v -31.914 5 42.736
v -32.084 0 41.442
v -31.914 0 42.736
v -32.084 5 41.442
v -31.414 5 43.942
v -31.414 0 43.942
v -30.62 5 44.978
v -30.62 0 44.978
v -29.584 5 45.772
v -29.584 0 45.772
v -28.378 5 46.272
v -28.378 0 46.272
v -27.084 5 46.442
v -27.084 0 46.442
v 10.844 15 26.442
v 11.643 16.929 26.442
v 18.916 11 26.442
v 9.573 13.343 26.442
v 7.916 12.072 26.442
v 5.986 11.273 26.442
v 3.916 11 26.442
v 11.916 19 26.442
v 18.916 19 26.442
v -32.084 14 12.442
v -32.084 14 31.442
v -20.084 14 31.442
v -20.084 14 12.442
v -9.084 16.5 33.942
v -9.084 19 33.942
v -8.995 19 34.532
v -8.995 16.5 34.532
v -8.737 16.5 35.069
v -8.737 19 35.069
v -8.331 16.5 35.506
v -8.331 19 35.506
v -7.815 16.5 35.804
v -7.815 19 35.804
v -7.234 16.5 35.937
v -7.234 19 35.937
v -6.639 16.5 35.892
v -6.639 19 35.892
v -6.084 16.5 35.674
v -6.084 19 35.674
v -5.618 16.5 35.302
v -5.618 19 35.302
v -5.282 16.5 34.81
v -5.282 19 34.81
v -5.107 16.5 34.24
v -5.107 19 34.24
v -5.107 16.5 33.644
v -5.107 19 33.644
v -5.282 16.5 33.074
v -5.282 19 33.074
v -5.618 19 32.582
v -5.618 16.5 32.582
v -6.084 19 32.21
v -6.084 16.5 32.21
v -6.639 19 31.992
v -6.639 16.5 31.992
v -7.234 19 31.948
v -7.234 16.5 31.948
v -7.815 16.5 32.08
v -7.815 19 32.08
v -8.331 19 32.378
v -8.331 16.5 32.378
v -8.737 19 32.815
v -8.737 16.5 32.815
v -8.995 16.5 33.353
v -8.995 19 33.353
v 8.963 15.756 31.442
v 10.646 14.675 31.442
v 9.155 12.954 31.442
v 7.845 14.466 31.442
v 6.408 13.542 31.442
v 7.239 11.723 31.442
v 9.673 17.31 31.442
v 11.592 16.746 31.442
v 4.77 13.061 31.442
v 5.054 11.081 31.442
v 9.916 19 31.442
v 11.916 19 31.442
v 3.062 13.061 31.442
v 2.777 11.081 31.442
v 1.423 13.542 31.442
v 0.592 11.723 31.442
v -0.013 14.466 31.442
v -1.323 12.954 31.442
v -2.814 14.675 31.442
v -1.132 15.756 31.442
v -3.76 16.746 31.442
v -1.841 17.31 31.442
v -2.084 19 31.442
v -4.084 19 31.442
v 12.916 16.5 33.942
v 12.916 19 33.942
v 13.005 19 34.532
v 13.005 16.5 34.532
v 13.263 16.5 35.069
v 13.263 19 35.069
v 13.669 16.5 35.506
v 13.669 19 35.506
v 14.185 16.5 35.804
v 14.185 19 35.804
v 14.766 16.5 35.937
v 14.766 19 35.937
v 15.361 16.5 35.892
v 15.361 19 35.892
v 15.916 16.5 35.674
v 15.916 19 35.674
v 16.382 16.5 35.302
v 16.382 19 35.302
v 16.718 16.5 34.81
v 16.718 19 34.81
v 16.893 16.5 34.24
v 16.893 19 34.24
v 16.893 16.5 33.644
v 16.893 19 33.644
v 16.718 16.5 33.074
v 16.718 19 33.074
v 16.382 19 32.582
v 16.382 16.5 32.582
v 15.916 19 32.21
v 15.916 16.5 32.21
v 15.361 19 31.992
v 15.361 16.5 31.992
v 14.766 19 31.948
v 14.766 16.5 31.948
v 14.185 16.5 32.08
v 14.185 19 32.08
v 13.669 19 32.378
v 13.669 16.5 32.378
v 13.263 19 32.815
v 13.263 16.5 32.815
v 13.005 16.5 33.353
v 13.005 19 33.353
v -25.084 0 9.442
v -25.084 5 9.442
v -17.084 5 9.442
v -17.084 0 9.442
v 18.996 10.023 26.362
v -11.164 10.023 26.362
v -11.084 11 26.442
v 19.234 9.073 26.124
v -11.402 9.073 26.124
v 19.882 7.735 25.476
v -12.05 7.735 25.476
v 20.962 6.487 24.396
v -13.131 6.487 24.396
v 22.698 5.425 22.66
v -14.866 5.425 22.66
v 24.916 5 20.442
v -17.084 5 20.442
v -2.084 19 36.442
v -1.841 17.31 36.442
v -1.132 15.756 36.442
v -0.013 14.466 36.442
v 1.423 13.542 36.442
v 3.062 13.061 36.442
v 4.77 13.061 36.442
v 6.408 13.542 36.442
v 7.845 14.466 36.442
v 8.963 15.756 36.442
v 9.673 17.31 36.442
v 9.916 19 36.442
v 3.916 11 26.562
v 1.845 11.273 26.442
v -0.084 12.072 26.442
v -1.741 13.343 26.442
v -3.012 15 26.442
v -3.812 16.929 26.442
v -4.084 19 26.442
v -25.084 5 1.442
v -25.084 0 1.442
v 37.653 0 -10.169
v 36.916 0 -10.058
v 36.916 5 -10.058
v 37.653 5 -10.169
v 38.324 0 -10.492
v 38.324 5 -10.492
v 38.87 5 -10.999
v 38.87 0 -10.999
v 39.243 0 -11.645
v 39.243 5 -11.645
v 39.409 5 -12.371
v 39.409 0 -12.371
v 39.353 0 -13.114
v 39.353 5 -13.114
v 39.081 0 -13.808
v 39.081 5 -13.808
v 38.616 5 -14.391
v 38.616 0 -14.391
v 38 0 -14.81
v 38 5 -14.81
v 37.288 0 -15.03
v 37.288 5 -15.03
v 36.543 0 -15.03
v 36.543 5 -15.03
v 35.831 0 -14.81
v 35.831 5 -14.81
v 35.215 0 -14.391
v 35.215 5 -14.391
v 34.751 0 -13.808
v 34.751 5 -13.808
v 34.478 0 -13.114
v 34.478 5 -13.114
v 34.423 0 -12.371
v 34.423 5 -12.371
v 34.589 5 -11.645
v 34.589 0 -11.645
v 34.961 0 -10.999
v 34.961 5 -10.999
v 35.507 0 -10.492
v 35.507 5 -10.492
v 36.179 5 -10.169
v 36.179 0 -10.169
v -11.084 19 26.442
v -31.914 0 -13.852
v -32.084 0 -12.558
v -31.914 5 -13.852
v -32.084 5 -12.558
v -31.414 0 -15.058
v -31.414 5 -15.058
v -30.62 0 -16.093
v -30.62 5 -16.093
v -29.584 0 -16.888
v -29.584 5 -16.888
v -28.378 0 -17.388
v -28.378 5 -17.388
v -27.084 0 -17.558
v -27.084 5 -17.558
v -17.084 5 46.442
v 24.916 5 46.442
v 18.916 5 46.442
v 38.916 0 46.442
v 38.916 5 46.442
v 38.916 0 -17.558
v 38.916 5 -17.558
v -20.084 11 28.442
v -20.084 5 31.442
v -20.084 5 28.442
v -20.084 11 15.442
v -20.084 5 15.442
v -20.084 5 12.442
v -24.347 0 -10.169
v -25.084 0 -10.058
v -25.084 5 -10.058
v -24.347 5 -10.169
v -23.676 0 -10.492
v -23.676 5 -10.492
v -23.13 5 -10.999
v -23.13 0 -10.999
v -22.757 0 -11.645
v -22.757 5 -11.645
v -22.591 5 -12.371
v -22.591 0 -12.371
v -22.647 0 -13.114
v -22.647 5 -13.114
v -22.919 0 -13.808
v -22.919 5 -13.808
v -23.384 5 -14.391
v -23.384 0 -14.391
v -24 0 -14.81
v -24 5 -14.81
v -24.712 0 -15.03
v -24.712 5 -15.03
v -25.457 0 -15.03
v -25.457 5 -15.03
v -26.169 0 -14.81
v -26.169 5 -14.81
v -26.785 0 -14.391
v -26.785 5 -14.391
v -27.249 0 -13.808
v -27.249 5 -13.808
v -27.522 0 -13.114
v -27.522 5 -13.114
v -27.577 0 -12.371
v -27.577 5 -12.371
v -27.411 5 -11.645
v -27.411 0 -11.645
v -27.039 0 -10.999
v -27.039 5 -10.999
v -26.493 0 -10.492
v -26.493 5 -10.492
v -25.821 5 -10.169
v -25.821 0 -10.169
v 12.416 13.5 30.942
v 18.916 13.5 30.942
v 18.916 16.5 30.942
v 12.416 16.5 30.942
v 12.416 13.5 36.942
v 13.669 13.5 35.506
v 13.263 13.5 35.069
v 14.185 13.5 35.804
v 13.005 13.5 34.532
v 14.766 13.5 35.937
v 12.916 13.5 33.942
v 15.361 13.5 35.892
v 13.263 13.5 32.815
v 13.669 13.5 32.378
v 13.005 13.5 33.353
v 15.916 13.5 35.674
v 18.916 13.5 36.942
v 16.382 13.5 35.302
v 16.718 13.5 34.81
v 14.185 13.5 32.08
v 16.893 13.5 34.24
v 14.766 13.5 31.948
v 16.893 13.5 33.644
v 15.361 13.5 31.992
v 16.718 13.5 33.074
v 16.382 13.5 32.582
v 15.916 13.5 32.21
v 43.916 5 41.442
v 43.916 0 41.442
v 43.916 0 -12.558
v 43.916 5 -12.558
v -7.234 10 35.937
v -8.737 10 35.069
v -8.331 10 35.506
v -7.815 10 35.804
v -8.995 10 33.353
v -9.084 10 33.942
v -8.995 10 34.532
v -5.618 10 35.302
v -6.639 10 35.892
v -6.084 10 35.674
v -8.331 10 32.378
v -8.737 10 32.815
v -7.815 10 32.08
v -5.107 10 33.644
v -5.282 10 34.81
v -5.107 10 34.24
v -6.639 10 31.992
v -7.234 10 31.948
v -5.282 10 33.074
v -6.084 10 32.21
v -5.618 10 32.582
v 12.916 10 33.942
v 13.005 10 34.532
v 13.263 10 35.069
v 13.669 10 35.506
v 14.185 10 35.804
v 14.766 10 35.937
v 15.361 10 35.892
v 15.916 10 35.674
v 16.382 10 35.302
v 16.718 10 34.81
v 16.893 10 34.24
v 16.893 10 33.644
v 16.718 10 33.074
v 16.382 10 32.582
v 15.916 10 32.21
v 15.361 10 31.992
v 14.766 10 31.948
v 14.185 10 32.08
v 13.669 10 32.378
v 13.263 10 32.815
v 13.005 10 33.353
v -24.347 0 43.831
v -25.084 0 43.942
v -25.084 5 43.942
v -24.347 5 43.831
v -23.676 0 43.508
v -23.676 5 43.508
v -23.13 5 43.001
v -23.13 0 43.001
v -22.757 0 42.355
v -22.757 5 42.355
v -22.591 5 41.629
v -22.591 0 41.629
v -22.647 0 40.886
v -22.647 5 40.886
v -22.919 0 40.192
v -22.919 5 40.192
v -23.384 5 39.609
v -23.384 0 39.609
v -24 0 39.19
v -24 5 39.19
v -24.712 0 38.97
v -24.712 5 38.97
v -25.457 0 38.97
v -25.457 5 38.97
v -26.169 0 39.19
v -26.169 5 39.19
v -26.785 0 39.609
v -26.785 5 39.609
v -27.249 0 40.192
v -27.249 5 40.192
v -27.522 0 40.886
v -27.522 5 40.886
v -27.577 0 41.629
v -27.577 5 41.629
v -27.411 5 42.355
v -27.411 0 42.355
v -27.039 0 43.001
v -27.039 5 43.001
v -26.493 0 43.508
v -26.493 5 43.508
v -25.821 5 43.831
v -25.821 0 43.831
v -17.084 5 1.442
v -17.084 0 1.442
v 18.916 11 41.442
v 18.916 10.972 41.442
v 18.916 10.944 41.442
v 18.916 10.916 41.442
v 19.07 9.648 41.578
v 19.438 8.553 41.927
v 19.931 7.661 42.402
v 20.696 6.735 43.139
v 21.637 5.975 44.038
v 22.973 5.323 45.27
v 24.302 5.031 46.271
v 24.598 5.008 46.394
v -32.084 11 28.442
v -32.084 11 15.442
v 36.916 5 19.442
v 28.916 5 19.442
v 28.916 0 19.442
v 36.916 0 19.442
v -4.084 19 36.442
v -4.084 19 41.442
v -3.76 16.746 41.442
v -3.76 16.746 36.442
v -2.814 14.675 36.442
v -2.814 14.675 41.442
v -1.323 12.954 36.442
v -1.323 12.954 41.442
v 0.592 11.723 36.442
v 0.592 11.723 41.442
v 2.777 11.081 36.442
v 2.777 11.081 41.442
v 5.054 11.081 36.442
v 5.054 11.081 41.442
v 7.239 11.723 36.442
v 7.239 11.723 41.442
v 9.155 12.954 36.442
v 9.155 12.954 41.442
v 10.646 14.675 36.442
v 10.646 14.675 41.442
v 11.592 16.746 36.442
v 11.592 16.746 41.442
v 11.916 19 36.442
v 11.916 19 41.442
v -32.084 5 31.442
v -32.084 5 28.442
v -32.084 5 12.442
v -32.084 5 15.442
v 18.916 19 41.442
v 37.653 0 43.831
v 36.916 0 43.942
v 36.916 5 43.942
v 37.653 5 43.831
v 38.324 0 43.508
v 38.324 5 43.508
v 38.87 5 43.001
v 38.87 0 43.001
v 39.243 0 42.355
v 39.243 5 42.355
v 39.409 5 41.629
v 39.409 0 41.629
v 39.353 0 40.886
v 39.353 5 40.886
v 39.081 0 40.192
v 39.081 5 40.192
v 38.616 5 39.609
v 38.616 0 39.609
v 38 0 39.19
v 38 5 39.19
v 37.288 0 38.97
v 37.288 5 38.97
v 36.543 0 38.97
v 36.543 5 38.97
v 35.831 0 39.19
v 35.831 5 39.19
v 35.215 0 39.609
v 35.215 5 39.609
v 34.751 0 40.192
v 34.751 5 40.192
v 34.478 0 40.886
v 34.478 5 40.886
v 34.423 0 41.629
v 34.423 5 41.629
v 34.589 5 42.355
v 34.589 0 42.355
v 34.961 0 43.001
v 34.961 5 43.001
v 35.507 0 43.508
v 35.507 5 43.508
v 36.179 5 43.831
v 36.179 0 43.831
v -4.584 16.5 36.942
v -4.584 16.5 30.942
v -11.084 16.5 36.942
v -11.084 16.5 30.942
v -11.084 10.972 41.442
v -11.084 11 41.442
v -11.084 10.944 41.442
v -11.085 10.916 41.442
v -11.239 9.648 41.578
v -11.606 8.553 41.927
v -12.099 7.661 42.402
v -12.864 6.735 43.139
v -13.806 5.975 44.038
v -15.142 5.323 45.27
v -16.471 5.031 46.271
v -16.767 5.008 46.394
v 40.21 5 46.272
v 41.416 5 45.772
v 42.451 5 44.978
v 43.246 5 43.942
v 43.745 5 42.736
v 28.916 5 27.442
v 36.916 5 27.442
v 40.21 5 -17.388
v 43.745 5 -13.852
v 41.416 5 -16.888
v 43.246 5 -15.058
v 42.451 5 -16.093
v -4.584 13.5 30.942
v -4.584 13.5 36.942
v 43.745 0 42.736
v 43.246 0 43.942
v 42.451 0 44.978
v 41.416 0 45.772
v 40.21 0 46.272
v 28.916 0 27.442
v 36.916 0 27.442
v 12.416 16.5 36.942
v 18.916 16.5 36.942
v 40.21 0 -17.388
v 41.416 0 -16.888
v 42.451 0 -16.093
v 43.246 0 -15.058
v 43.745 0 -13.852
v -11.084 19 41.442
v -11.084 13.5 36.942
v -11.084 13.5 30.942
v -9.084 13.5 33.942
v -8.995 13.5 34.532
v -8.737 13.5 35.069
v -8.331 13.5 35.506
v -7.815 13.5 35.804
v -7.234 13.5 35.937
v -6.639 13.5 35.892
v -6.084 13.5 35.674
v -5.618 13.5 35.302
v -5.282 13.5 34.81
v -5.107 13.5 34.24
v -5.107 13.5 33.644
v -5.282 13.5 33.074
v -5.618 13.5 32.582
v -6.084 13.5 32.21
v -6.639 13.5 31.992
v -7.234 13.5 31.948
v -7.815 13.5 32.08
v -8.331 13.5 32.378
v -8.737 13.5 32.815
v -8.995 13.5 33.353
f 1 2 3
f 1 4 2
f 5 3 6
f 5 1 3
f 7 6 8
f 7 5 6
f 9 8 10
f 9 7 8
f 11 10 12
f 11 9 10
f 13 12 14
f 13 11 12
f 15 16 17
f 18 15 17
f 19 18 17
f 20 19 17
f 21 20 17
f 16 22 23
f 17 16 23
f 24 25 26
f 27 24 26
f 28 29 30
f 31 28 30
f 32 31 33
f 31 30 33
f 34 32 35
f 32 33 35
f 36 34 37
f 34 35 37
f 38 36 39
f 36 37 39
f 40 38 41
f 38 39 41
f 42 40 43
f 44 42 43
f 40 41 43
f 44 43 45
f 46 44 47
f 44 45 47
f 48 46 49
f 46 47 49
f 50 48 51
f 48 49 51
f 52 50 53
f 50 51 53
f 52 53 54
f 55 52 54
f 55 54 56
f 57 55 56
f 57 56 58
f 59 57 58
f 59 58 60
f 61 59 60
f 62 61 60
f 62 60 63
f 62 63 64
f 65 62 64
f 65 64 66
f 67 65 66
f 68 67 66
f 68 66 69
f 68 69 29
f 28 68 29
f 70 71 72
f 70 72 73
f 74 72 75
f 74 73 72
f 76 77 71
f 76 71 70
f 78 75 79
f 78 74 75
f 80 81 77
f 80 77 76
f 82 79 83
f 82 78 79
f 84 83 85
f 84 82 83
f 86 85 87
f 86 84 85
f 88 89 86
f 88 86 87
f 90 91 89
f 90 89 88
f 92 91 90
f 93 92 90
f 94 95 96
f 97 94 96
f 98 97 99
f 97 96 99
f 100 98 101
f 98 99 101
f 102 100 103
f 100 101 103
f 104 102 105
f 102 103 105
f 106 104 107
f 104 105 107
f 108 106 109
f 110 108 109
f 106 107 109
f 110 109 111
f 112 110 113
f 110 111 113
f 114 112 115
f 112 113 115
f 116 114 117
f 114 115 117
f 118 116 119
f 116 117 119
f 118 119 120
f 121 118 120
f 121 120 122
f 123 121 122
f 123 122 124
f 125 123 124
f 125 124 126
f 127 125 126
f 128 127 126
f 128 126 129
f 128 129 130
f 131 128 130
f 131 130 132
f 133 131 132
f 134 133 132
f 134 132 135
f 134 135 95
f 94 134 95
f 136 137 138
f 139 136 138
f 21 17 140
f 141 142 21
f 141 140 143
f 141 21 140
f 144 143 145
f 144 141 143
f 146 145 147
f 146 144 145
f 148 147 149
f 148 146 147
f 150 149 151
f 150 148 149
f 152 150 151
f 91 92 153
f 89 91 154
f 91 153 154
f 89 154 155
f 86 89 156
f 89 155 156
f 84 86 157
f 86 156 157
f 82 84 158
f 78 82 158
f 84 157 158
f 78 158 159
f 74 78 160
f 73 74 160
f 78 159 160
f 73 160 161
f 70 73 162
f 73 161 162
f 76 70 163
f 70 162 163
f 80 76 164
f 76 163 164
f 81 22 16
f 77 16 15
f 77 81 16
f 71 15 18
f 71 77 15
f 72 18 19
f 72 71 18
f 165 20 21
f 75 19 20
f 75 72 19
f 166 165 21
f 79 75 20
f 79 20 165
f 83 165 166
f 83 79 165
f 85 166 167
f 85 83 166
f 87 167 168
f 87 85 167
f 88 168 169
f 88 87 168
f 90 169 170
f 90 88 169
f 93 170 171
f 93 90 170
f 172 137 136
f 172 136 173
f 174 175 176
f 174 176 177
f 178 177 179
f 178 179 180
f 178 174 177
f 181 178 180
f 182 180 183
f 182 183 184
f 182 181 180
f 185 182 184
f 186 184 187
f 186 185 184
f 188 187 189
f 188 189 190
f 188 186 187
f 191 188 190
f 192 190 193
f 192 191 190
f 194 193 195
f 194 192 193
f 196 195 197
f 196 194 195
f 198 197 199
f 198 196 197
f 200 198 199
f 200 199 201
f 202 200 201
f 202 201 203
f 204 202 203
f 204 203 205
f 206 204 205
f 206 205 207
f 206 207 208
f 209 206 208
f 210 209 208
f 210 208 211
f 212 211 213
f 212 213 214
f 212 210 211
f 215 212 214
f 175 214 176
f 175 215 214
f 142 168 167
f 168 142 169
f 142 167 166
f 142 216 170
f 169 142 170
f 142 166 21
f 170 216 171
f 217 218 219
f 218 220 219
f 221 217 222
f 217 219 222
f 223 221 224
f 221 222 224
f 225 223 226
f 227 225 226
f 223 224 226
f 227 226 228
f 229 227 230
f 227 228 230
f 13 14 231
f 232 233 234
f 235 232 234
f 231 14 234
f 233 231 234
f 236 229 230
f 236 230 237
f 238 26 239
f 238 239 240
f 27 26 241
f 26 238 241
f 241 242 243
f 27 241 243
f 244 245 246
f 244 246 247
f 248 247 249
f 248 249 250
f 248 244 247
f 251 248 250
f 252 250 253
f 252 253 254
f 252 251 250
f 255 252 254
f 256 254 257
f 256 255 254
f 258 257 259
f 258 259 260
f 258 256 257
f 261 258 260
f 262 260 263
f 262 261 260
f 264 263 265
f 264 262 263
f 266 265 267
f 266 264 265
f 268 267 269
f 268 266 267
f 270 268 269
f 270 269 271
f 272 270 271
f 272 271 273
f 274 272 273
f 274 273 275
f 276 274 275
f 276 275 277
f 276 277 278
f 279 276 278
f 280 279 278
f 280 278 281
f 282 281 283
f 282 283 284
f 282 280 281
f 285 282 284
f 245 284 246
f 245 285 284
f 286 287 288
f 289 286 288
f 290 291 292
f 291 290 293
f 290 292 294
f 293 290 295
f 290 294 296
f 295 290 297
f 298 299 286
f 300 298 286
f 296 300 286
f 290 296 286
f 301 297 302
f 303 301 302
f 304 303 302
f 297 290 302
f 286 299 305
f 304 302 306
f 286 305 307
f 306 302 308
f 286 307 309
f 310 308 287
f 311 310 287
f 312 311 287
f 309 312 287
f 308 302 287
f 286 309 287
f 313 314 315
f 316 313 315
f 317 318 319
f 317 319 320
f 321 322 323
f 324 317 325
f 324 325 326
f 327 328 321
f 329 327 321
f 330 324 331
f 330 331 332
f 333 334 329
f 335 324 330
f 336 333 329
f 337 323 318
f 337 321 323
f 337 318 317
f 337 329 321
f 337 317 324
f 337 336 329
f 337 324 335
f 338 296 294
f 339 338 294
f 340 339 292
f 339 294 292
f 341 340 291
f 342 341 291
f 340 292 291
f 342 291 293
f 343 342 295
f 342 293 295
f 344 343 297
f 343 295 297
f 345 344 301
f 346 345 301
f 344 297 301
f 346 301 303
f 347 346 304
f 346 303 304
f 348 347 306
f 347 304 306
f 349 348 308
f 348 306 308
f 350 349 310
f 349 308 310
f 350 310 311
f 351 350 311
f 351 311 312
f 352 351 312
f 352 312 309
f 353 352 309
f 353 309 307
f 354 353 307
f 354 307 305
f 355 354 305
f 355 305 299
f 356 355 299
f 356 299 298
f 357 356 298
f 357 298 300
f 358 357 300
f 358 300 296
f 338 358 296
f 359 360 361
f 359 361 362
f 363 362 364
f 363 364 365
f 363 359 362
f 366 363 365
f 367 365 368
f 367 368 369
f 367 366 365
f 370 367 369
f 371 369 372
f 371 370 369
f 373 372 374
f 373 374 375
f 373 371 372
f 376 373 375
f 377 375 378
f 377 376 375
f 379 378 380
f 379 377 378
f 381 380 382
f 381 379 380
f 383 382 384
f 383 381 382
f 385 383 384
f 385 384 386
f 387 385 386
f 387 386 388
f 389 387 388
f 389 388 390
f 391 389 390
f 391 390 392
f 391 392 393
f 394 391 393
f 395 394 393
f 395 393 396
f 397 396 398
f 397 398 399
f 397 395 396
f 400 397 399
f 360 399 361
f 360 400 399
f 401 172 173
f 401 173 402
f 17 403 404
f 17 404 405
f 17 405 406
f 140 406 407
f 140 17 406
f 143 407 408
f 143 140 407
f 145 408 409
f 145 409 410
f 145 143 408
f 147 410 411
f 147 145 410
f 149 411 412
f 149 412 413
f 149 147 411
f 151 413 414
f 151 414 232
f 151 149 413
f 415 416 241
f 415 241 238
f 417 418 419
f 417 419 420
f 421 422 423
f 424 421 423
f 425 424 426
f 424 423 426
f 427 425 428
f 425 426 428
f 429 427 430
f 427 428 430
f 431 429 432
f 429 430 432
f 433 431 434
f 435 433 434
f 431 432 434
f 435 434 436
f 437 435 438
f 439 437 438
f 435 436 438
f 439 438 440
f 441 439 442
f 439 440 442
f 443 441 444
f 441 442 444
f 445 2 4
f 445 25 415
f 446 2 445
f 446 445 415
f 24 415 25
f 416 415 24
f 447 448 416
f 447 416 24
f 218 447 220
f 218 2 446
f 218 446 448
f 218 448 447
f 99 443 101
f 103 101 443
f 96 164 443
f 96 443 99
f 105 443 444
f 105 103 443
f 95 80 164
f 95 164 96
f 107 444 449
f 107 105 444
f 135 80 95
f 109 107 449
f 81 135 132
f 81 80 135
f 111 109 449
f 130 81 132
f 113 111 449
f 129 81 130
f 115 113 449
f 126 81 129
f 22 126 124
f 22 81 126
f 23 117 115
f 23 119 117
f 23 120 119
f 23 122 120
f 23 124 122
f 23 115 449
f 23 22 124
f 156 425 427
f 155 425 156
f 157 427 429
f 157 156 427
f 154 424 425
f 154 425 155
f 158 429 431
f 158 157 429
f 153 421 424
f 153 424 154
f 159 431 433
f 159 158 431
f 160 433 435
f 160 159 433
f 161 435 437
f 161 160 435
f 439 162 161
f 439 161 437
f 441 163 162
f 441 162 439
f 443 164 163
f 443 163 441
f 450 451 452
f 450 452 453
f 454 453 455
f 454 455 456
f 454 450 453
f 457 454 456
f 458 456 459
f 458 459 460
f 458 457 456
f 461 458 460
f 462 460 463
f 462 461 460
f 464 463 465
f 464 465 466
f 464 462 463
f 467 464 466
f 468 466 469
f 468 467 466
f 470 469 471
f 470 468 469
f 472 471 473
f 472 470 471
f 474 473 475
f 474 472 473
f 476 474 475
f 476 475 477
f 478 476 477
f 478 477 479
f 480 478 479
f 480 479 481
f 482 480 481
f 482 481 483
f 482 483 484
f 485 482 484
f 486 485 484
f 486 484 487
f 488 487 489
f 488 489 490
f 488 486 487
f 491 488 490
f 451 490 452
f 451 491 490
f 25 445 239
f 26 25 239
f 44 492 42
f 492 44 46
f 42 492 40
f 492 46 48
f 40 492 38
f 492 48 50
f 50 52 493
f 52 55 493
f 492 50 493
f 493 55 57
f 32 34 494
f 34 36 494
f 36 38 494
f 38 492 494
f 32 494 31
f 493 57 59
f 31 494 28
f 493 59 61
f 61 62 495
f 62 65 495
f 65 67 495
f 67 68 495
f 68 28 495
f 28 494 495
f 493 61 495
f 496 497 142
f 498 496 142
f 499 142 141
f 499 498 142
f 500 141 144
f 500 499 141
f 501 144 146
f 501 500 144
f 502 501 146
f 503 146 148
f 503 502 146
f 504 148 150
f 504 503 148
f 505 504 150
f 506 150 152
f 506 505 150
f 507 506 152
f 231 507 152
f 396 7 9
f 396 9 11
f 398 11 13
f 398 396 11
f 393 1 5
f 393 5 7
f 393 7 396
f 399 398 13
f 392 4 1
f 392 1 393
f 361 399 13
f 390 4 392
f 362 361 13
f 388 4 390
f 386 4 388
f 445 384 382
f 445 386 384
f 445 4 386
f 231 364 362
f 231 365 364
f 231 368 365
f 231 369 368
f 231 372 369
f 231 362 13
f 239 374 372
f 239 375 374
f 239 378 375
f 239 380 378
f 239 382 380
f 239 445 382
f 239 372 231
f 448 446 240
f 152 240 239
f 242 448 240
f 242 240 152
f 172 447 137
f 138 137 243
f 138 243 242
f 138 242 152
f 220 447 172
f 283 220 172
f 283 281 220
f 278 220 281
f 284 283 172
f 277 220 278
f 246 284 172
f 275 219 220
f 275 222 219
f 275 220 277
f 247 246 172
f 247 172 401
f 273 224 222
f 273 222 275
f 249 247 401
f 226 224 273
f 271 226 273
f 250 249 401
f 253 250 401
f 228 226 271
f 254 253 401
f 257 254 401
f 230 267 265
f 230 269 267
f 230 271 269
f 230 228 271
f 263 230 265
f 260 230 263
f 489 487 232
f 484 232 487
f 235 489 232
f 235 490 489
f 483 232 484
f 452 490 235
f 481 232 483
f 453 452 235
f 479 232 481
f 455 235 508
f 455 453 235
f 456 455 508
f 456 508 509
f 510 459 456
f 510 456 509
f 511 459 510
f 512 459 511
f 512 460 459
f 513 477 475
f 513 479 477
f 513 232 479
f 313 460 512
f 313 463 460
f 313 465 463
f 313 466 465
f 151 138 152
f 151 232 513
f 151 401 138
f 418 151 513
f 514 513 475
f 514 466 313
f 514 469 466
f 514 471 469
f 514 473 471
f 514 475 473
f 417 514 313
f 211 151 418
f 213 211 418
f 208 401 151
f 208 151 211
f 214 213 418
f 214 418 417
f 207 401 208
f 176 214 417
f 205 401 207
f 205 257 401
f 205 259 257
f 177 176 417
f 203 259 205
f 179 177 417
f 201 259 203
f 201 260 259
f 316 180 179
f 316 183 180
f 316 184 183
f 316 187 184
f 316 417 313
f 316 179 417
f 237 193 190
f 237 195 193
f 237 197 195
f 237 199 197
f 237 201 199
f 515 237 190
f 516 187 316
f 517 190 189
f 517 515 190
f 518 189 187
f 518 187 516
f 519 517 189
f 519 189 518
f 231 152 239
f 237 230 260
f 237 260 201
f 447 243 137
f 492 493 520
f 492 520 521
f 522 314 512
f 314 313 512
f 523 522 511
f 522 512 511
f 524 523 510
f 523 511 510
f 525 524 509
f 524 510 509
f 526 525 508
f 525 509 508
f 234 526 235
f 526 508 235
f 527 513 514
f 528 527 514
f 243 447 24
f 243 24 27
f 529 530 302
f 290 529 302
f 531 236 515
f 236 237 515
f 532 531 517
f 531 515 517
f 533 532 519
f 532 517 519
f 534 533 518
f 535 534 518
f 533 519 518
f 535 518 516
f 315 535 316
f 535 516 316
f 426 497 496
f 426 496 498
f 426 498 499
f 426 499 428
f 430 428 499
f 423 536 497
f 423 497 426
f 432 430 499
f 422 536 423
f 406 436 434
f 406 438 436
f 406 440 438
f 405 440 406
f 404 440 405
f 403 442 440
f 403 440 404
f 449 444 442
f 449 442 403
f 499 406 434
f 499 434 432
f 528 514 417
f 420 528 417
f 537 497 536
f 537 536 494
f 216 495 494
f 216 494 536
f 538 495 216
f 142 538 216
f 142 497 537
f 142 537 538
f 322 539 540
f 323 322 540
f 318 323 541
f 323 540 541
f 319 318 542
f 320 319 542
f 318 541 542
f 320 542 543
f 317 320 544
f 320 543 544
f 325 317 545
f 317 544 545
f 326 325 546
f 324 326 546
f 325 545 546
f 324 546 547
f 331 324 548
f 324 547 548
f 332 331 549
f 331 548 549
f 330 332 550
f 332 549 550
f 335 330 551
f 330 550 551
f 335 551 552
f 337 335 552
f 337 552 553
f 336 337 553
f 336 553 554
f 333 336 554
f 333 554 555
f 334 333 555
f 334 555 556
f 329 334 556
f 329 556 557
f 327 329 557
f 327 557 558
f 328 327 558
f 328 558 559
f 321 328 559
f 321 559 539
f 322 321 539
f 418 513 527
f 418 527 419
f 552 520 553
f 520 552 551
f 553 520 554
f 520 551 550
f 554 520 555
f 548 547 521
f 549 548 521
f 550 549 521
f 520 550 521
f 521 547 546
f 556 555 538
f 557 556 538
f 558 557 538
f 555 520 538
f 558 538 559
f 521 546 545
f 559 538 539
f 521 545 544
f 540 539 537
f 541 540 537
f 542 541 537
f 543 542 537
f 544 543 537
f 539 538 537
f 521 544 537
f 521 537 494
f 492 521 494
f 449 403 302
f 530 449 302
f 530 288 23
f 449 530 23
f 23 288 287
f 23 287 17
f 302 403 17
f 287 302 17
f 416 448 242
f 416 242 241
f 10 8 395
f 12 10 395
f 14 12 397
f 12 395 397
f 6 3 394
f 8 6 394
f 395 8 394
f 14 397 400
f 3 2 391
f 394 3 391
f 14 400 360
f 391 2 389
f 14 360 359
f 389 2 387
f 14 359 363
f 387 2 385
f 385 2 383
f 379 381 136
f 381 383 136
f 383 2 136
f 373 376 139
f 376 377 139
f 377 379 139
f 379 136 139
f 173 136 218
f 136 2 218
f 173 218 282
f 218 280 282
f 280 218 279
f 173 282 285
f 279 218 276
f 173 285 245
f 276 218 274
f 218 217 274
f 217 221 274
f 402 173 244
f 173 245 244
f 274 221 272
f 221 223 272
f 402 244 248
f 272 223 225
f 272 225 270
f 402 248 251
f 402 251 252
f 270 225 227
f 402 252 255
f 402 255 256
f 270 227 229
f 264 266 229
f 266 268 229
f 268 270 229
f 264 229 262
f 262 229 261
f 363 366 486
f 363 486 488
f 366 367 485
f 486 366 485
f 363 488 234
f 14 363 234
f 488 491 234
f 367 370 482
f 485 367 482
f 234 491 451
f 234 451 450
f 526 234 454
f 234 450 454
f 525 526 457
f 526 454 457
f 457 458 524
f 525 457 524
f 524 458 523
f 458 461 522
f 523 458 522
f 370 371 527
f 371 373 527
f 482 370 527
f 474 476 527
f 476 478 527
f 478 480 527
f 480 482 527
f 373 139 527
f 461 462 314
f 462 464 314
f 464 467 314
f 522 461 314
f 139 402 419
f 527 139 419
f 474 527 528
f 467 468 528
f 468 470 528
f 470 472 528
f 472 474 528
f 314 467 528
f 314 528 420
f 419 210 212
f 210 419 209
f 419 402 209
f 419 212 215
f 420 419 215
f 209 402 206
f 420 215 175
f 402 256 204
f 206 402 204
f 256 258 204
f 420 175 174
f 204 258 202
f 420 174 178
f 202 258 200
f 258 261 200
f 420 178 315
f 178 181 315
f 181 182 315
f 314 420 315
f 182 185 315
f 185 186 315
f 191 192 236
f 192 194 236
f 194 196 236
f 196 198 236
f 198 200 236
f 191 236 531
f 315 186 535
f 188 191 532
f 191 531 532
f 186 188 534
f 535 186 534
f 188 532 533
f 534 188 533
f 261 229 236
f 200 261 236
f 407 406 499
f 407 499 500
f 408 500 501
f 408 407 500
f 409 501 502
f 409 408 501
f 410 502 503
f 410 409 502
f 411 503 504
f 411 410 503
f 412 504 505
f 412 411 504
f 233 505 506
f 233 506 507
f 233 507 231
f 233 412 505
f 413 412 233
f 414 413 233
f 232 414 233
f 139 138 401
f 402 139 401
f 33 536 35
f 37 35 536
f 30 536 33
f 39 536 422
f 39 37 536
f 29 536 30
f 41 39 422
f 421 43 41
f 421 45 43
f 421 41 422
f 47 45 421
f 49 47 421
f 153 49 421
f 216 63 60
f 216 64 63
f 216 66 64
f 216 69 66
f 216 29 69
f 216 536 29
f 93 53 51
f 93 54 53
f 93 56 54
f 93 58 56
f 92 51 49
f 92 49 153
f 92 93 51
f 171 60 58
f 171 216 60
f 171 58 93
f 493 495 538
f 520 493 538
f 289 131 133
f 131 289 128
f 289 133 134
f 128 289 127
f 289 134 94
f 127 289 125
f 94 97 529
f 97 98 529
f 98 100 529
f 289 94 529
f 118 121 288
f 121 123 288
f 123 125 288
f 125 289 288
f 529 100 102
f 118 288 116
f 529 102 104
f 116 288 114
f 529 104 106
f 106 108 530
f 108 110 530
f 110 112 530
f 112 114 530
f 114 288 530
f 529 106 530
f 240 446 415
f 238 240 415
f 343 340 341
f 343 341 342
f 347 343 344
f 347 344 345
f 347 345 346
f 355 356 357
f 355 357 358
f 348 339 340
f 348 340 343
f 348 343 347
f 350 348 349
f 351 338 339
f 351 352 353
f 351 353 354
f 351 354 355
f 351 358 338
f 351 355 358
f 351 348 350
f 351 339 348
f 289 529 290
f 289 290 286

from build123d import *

# Parameters (mm, degrees)
SKETCH1_W           = 76
SKETCH1_H           = 64
SKETCH1_R           = 2.5
BOSS_EXTRUDE1_DEPTH = 5
SKETCH2_W           = 30
SKETCH2_H           = 15
BOSS_EXTRUDE2_DEPTH = 14
SKETCH3_R           = 6
CUT_EXTRUDE1_DEPTH  = 76.964442768
CUT_EXTRUDE2_DEPTH  = 5
CUT_EXTRUDE3_START  = -5
CUT_EXTRUDE3_DEPTH  = 5
FILLET1_R           = 6
SKETCH6_W           = 8
SKETCH6_H           = 8
CUT_EXTRUDE4_DEPTH  = 66.432910035
SKETCH7_W           = 12
SKETCH7_H           = 19
BOSS_EXTRUDE3_DEPTH = 9
SKETCH9_W           = 13
SKETCH9_H           = 6
CUT_EXTRUDE5_DEPTH  = 14
FILLET3_R           = 5
CUT_EXTRUDE6_DEPTH  = 9
SKETCH11_W          = 3
SKETCH11_H          = 1.5
CUT_EXTRUDE7_DEPTH  = 6.5
SKETCH13_W          = 3
SKETCH13_H          = 1.5
CUT_EXTRUDE8_DEPTH  = 6.5


with BuildPart() as part:
    # Sketch1 → Boss-Extrude1 (new body)
    with BuildSketch(Plane(origin=(0, 0, 0), x_dir=(1, 0, 0), z_dir=(0, 1, 0))):
        with Locations((5.915789474, -14.442105263)):
            Rectangle(SKETCH1_W, SKETCH1_H)
        with Locations(Location((36.915789474, 12.557894737, 0), (0, 0, 270))):
            Circle(SKETCH1_R, mode=Mode.SUBTRACT)
        with Locations(Location((-25.084210526, 12.557894737, 0), (0, 0, 270))):
            Circle(SKETCH1_R, mode=Mode.SUBTRACT)
        with Locations(Location((36.915789474, -41.442105263, 0), (0, 0, 270))):
            Circle(SKETCH1_R, mode=Mode.SUBTRACT)
        with Locations(Location((-25.084210526, -41.442105263, 0), (0, 0, 270))):
            Circle(SKETCH1_R, mode=Mode.SUBTRACT)
    extrude(amount=BOSS_EXTRUDE1_DEPTH)

    # Sketch2 → Boss-Extrude2 (add)
    with BuildSketch(Plane(origin=(0, 5, 0), x_dir=(1, 0, 0), z_dir=(0, 1, 0))):
        with Locations((3.915789474, -33.942105263)):
            Rectangle(SKETCH2_W, SKETCH2_H)
    extrude(amount=BOSS_EXTRUDE2_DEPTH)

    # Sketch3 → Cut-Extrude1 (cut, through all)
    with BuildSketch(Plane.XY.offset(41.442105263)):
        with Locations((3.915789474, 19)):
            Circle(SKETCH3_R)
    extrude(amount=-CUT_EXTRUDE1_DEPTH, mode=Mode.SUBTRACT)

    # Sketch4 → Cut-Extrude2 (cut)
    with BuildSketch(Plane.XY.offset(41.442105263)):
        with BuildLine():
            ThreePointArc((9.915789474, 19), (3.915789474, 13), (-2.084210526, 19))
            Line((-2.084210526, 19), (-4.084210526, 19))
            ThreePointArc((-4.084210526, 19), (3.915789474, 11), (11.915789474, 19))
            Line((11.915789474, 19), (9.915789474, 19))
        make_face()
    extrude(amount=-CUT_EXTRUDE2_DEPTH, mode=Mode.SUBTRACT)

    # Sketch5 → Cut-Extrude3 (cut)
    with BuildSketch(Plane(origin=(0, 0, 26.442105263), x_dir=(-1, 0, 0), z_dir=(0, 0, -1)).offset(CUT_EXTRUDE3_START)):
        with BuildLine():
            ThreePointArc((2.084210526, 19), (-3.915789474, 13), (-9.915789474, 19))
            Line((-9.915789474, 19), (-11.915789474, 19))
            ThreePointArc((-11.915789474, 19), (-3.915789474, 11), (4.084210526, 19))
            Line((4.084210526, 19), (2.084210526, 19))
        make_face()
    extrude(amount=CUT_EXTRUDE3_DEPTH, mode=Mode.SUBTRACT)

    # Fillet1
    # the kernel refuses this fillet: 6 mm, written as the material it adds along each edge
    with BuildSketch(Plane(origin=(-11.084210526, 5, 41.442105263), x_dir=(-1, 0, 0), z_dir=(0, 0, -1)), Plane(origin=(18.915789474, 5, 26.442105263), x_dir=(1, 0, 0), z_dir=(0, 0, 1))) as fillet1_piece_1:
        with BuildLine():
            CenterArc((FILLET1_R, FILLET1_R), FILLET1_R, 180, 90)
            Line((0, FILLET1_R), (-FILLET1_R * 0.02, FILLET1_R))
            Line((-FILLET1_R * 0.02, FILLET1_R), (-FILLET1_R * 0.02, -FILLET1_R * 0.02))
            Line((-FILLET1_R * 0.02, -FILLET1_R * 0.02), (FILLET1_R, -FILLET1_R * 0.02))
            Line((FILLET1_R, -FILLET1_R * 0.02), (FILLET1_R, 0))
        make_face()
    extrude(amount=15)
    with BuildSketch(Plane(origin=(18.915789474, 5, 41.442105263), x_dir=(0, 0, 1), z_dir=(-1, 0, 0))) as fillet1_piece_2:
        with BuildLine():
            CenterArc((6, 5.916079783), FILLET1_R, 180, 80.405931773)
            Line((0, 5.916079783), (-0.12, 5.916079783))
            Line((-0.12, 5.916079783), (-0.12, 0))
            Line((-0.12, 0), (0, -0.12))
            ThreePointArc((0, -0.12), (2.5, -0.12), (4.98, -0.118321596))
            Line((4.98, -0.118321596), (5, 0))
        make_face()
    extrude(amount=30)
    with BuildSketch(Plane(origin=(-11.084210526, 5, 26.442105263), x_dir=(0, 0, -1), z_dir=(1, 0, 0))) as fillet1_piece_3:
        with BuildLine():
            CenterArc((FILLET1_R, FILLET1_R), FILLET1_R, 180, 90)
            Line((0, FILLET1_R), (-FILLET1_R * 0.02, FILLET1_R))
            Line((-FILLET1_R * 0.02, FILLET1_R), (-FILLET1_R * 0.02, -FILLET1_R * 0.02))
            Line((-FILLET1_R * 0.02, -FILLET1_R * 0.02), (FILLET1_R, -FILLET1_R * 0.02))
            Line((FILLET1_R, -FILLET1_R * 0.02), (FILLET1_R, 0))
        make_face()
    extrude(amount=30)
    with BuildSketch(Plane(origin=(18.915789474, 5, 41.442105263), x_dir=(0, 0, 1), z_dir=(-1, 0, 0))) as fillet1_piece_4a_section:
        with BuildLine():
            CenterArc((6, 5.916079783), FILLET1_R, 180, 80.405931773)
            Line((0, 5.916079783), (-0.12, 5.916079783))
            Line((-0.12, 5.916079783), (-0.12, 0))
            Line((-0.12, 0), (0, -0.12))
            ThreePointArc((0, -0.12), (2.5, -0.12), (4.98, -0.118321596))
            Line((4.98, -0.118321596), (5, 0))
        make_face()
    fillet1_piece_4a = extrude(amount=44.790199458, mode=Mode.PRIVATE)
    fillet1_piece_4a = fillet1_piece_4a - Plane(origin=(-25.084210526, 6.312351874, 41.442105263), x_dir=(0, 0, 1), z_dir=(0, -1, 0)) * Cylinder(2.5, 114, mode=Mode.PRIVATE)
    fillet1_piece_4a = split(fillet1_piece_4a, bisect_by=Plane(origin=(-11.084210526, 6.312351874, 42.775348467), z_dir=(-1, 0, 0)), keep=Keep.TOP, mode=Mode.PRIVATE)
    with BuildSketch(Plane(origin=(-11.084210526, 5, 56.442105263), x_dir=(-1, 0, 0), z_dir=(0, 0, -1))) as fillet1_piece_4b_section:
        with BuildLine():
            CenterArc((FILLET1_R, FILLET1_R), FILLET1_R, 180, 90)
            Line((0, FILLET1_R), (-FILLET1_R * 0.02, FILLET1_R))
            Line((-FILLET1_R * 0.02, FILLET1_R), (-FILLET1_R * 0.02, -FILLET1_R * 0.02))
            Line((-FILLET1_R * 0.02, -FILLET1_R * 0.02), (FILLET1_R, -FILLET1_R * 0.02))
            Line((FILLET1_R, -FILLET1_R * 0.02), (FILLET1_R, 0))
        make_face()
    fillet1_piece_4b = extrude(amount=30, mode=Mode.PRIVATE)
    fillet1_piece_4b = split(fillet1_piece_4b, bisect_by=Plane(origin=(-12.442581212, 6.358370686, 46.442105263), z_dir=(0, 0, -1)), keep=Keep.TOP, mode=Mode.PRIVATE)
    fillet1_piece_4b = split(fillet1_piece_4b, bisect_by=Plane(origin=(-12.442581212, 6.358370686, 41.442105263), z_dir=(0, 0, 1)), keep=Keep.TOP, mode=Mode.PRIVATE)
    fillet1_piece_4 = fillet1_piece_4a & fillet1_piece_4b
    add(fillet1_piece_4)
    with BuildSketch(Plane(origin=(-26.084210526, 5, 26.442105263), x_dir=(0, 0, -1), z_dir=(1, 0, 0))) as fillet1_piece_5a_section:
        with BuildLine():
            CenterArc((FILLET1_R, FILLET1_R), FILLET1_R, 180, 90)
            Line((0, FILLET1_R), (-FILLET1_R * 0.02, FILLET1_R))
            Line((-FILLET1_R * 0.02, FILLET1_R), (-FILLET1_R * 0.02, -FILLET1_R * 0.02))
            Line((-FILLET1_R * 0.02, -FILLET1_R * 0.02), (FILLET1_R, -FILLET1_R * 0.02))
            Line((FILLET1_R, -FILLET1_R * 0.02), (FILLET1_R, 0))
        make_face()
    fillet1_piece_5a = extrude(amount=45, mode=Mode.PRIVATE)
    fillet1_piece_5a = split(fillet1_piece_5a, bisect_by=Plane(origin=(-11.084210526, 6.358370686, 25.083734578), z_dir=(-1, 0, 0)), keep=Keep.TOP, mode=Mode.PRIVATE)
    with BuildSketch(Plane(origin=(-11.084210526, 5, 41.442105263), x_dir=(-1, 0, 0), z_dir=(0, 0, -1))) as fillet1_piece_5b_section:
        with BuildLine():
            CenterArc((FILLET1_R, FILLET1_R), FILLET1_R, 180, 90)
            Line((0, FILLET1_R), (-FILLET1_R * 0.02, FILLET1_R))
            Line((-FILLET1_R * 0.02, FILLET1_R), (-FILLET1_R * 0.02, -FILLET1_R * 0.02))
            Line((-FILLET1_R * 0.02, -FILLET1_R * 0.02), (FILLET1_R, -FILLET1_R * 0.02))
            Line((FILLET1_R, -FILLET1_R * 0.02), (FILLET1_R, 0))
        make_face()
    fillet1_piece_5b = extrude(amount=30, mode=Mode.PRIVATE)
    fillet1_piece_5b = split(fillet1_piece_5b, bisect_by=Plane(origin=(-12.442581212, 6.358370686, 26.442105263), z_dir=(0, 0, -1)), keep=Keep.TOP, mode=Mode.PRIVATE)
    fillet1_piece_5 = fillet1_piece_5a & fillet1_piece_5b
    add(fillet1_piece_5)
    with BuildSketch(Plane(origin=(18.915789474, 5, 26.442105263), x_dir=(1, 0, 0), z_dir=(0, 0, 1))) as fillet1_piece_6a_section:
        with BuildLine():
            CenterArc((FILLET1_R, FILLET1_R), FILLET1_R, 180, 90)
            Line((0, FILLET1_R), (-FILLET1_R * 0.02, FILLET1_R))
            Line((-FILLET1_R * 0.02, FILLET1_R), (-FILLET1_R * 0.02, -FILLET1_R * 0.02))
            Line((-FILLET1_R * 0.02, -FILLET1_R * 0.02), (FILLET1_R, -FILLET1_R * 0.02))
            Line((FILLET1_R, -FILLET1_R * 0.02), (FILLET1_R, 0))
        make_face()
    fillet1_piece_6a = extrude(amount=30, mode=Mode.PRIVATE)
    fillet1_piece_6a = split(fillet1_piece_6a, bisect_by=Plane(origin=(20.274160159, 6.358370686, 46.442105263), z_dir=(0, 0, -1)), keep=Keep.TOP, mode=Mode.PRIVATE)
    fillet1_piece_6a = split(fillet1_piece_6a, bisect_by=Plane(origin=(20.274160159, 6.358370686, 41.442105263), z_dir=(0, 0, 1)), keep=Keep.TOP, mode=Mode.PRIVATE)
    with BuildSketch(Plane(origin=(33.705988931, 5, 41.442105263), x_dir=(0, 0, 1), z_dir=(-1, 0, 0))) as fillet1_piece_6b_section:
        with BuildLine():
            CenterArc((6, 5.916079783), FILLET1_R, 180, 80.405931773)
            Line((0, 5.916079783), (-0.12, 5.916079783))
            Line((-0.12, 5.916079783), (-0.12, 0))
            Line((-0.12, 0), (0, -0.12))
            ThreePointArc((0, -0.12), (2.5, -0.12), (4.98, -0.118321596))
            Line((4.98, -0.118321596), (5, 0))
        make_face()
    fillet1_piece_6b = extrude(amount=44.790199458, mode=Mode.PRIVATE)
    fillet1_piece_6b = split(fillet1_piece_6b, bisect_by=Plane(origin=(18.915789474, 6.37196406, 42.676023134), z_dir=(1, 0, 0)), keep=Keep.TOP, mode=Mode.PRIVATE)
    fillet1_piece_6 = fillet1_piece_6a & fillet1_piece_6b
    add(fillet1_piece_6)
    with BuildSketch(Plane(origin=(-11.084210526, 5, 26.442105263), x_dir=(0, 0, -1), z_dir=(1, 0, 0))) as fillet1_piece_7a_section:
        with BuildLine():
            CenterArc((FILLET1_R, FILLET1_R), FILLET1_R, 180, 90)
            Line((0, FILLET1_R), (-FILLET1_R * 0.02, FILLET1_R))
            Line((-FILLET1_R * 0.02, FILLET1_R), (-FILLET1_R * 0.02, -FILLET1_R * 0.02))
            Line((-FILLET1_R * 0.02, -FILLET1_R * 0.02), (FILLET1_R, -FILLET1_R * 0.02))
            Line((FILLET1_R, -FILLET1_R * 0.02), (FILLET1_R, 0))
        make_face()
    fillet1_piece_7a = extrude(amount=45, mode=Mode.PRIVATE)
    fillet1_piece_7a = split(fillet1_piece_7a, bisect_by=Plane(origin=(18.915789474, 6.358370686, 25.083734578), z_dir=(1, 0, 0)), keep=Keep.TOP, mode=Mode.PRIVATE)
    with BuildSketch(Plane(origin=(18.915789474, 5, 11.442105263), x_dir=(1, 0, 0), z_dir=(0, 0, 1))) as fillet1_piece_7b_section:
        with BuildLine():
            CenterArc((FILLET1_R, FILLET1_R), FILLET1_R, 180, 90)
            Line((0, FILLET1_R), (-FILLET1_R * 0.02, FILLET1_R))
            Line((-FILLET1_R * 0.02, FILLET1_R), (-FILLET1_R * 0.02, -FILLET1_R * 0.02))
            Line((-FILLET1_R * 0.02, -FILLET1_R * 0.02), (FILLET1_R, -FILLET1_R * 0.02))
            Line((FILLET1_R, -FILLET1_R * 0.02), (FILLET1_R, 0))
        make_face()
    fillet1_piece_7b = extrude(amount=30, mode=Mode.PRIVATE)
    fillet1_piece_7b = split(fillet1_piece_7b, bisect_by=Plane(origin=(20.274160159, 6.358370686, 26.442105263), z_dir=(0, 0, -1)), keep=Keep.TOP, mode=Mode.PRIVATE)
    fillet1_piece_7 = fillet1_piece_7a & fillet1_piece_7b
    add(fillet1_piece_7)

    # Sketch6 → Cut-Extrude4 (cut, through all)
    with BuildSketch(Plane(origin=(0, 5, 0), x_dir=(1, 0, 0), z_dir=(0, 1, 0))):
        with Locations((32.915789474, -23.442105263)):
            Rectangle(SKETCH6_W, SKETCH6_H)
        with Locations((-21.084210526, -5.442105263)):
            Rectangle(SKETCH6_W, SKETCH6_H)
    extrude(amount=-CUT_EXTRUDE4_DEPTH, mode=Mode.SUBTRACT)

    # Sketch7 → Boss-Extrude3 (add)
    with BuildSketch(Plane(origin=(0, 5, 0), x_dir=(1, 0, 0), z_dir=(0, 1, 0))):
        with Locations((-26.084210526, -21.942105263)):
            Rectangle(SKETCH7_W, SKETCH7_H)
    extrude(amount=BOSS_EXTRUDE3_DEPTH)

    # Sketch9 → Cut-Extrude5 (cut)
    with BuildSketch(Plane.ZY.offset(32.084210526)):
        with Locations((21.942105263, 8)):
            Rectangle(SKETCH9_W, SKETCH9_H)
    extrude(amount=-CUT_EXTRUDE5_DEPTH, mode=Mode.SUBTRACT)

    # Fillet3
    fillet3_edges = [part.edges().sort_by_distance(p)[0] for p in [
        (-32.084210526, 2.5, -17.557894737),
        (43.915789474, 2.5, -17.557894737),
        (43.915789474, 2.5, 46.442105263),
        (-32.084210526, 2.5, 46.442105263),
    ]]
    fillet(fillet3_edges, radius=FILLET3_R)

    # Sketch10 → Cut-Extrude6 (cut)
    with BuildSketch(Plane(origin=(0, 19, 0), x_dir=(1, 0, 0), z_dir=(0, 1, 0))):
        with BuildLine():
            ThreePointArc((-5.084210526, -33.942105263), (-7.084210526, -31.942105263), (-9.084210526, -33.942105263))
            Line((-9.084210526, -33.942105263), (-5.084210526, -33.942105263))
        make_face()
        with BuildLine():
            Line((-5.084210526, -33.942105263), (-9.084210526, -33.942105263))
            ThreePointArc((-9.084210526, -33.942105263), (-7.084210526, -35.942105263), (-5.084210526, -33.942105263))
        make_face()
        with BuildLine():
            ThreePointArc((16.915789474, -33.942105263), (14.915789474, -31.942105263), (12.915789474, -33.942105263))
            Line((12.915789474, -33.942105263), (16.915789474, -33.942105263))
        make_face()
        with BuildLine():
            Line((16.915789474, -33.942105263), (12.915789474, -33.942105263))
            ThreePointArc((12.915789474, -33.942105263), (14.915789474, -35.942105263), (16.915789474, -33.942105263))
        make_face()
    extrude(amount=-CUT_EXTRUDE6_DEPTH, mode=Mode.SUBTRACT)

    # Sketch11 → Cut-Extrude7 (cut)
    with BuildSketch(Plane.ZY.offset(11.084210526)):
        with Locations((32.442105263, 15.75)):
            Rectangle(SKETCH11_W, SKETCH11_H)
        with Locations((35.442105263, 15.75)):
            Rectangle(SKETCH11_W, SKETCH11_H)
        with Locations((35.442105263, 14.25)):
            Rectangle(SKETCH11_W, SKETCH11_H)
        with Locations((32.442105263, 14.25)):
            Rectangle(SKETCH11_W, SKETCH11_H)
    extrude(amount=-CUT_EXTRUDE7_DEPTH, mode=Mode.SUBTRACT)

    # Sketch13 → Cut-Extrude8 (cut)
    with BuildSketch(Plane(origin=(18.915789474, 0, 0), x_dir=(0, 0, -1), z_dir=(1, 0, 0))):
        with Locations((-35.442105263, 15.75)):
            Rectangle(SKETCH13_W, SKETCH13_H)
        with Locations((-32.442105263, 15.75)):
            Rectangle(SKETCH13_W, SKETCH13_H)
        with Locations((-32.442105263, 14.25)):
            Rectangle(SKETCH13_W, SKETCH13_H)
        with Locations((-35.442105263, 14.25)):
            Rectangle(SKETCH13_W, SKETCH13_H)
    extrude(amount=-CUT_EXTRUDE8_DEPTH, mode=Mode.SUBTRACT)


solid = part.part
